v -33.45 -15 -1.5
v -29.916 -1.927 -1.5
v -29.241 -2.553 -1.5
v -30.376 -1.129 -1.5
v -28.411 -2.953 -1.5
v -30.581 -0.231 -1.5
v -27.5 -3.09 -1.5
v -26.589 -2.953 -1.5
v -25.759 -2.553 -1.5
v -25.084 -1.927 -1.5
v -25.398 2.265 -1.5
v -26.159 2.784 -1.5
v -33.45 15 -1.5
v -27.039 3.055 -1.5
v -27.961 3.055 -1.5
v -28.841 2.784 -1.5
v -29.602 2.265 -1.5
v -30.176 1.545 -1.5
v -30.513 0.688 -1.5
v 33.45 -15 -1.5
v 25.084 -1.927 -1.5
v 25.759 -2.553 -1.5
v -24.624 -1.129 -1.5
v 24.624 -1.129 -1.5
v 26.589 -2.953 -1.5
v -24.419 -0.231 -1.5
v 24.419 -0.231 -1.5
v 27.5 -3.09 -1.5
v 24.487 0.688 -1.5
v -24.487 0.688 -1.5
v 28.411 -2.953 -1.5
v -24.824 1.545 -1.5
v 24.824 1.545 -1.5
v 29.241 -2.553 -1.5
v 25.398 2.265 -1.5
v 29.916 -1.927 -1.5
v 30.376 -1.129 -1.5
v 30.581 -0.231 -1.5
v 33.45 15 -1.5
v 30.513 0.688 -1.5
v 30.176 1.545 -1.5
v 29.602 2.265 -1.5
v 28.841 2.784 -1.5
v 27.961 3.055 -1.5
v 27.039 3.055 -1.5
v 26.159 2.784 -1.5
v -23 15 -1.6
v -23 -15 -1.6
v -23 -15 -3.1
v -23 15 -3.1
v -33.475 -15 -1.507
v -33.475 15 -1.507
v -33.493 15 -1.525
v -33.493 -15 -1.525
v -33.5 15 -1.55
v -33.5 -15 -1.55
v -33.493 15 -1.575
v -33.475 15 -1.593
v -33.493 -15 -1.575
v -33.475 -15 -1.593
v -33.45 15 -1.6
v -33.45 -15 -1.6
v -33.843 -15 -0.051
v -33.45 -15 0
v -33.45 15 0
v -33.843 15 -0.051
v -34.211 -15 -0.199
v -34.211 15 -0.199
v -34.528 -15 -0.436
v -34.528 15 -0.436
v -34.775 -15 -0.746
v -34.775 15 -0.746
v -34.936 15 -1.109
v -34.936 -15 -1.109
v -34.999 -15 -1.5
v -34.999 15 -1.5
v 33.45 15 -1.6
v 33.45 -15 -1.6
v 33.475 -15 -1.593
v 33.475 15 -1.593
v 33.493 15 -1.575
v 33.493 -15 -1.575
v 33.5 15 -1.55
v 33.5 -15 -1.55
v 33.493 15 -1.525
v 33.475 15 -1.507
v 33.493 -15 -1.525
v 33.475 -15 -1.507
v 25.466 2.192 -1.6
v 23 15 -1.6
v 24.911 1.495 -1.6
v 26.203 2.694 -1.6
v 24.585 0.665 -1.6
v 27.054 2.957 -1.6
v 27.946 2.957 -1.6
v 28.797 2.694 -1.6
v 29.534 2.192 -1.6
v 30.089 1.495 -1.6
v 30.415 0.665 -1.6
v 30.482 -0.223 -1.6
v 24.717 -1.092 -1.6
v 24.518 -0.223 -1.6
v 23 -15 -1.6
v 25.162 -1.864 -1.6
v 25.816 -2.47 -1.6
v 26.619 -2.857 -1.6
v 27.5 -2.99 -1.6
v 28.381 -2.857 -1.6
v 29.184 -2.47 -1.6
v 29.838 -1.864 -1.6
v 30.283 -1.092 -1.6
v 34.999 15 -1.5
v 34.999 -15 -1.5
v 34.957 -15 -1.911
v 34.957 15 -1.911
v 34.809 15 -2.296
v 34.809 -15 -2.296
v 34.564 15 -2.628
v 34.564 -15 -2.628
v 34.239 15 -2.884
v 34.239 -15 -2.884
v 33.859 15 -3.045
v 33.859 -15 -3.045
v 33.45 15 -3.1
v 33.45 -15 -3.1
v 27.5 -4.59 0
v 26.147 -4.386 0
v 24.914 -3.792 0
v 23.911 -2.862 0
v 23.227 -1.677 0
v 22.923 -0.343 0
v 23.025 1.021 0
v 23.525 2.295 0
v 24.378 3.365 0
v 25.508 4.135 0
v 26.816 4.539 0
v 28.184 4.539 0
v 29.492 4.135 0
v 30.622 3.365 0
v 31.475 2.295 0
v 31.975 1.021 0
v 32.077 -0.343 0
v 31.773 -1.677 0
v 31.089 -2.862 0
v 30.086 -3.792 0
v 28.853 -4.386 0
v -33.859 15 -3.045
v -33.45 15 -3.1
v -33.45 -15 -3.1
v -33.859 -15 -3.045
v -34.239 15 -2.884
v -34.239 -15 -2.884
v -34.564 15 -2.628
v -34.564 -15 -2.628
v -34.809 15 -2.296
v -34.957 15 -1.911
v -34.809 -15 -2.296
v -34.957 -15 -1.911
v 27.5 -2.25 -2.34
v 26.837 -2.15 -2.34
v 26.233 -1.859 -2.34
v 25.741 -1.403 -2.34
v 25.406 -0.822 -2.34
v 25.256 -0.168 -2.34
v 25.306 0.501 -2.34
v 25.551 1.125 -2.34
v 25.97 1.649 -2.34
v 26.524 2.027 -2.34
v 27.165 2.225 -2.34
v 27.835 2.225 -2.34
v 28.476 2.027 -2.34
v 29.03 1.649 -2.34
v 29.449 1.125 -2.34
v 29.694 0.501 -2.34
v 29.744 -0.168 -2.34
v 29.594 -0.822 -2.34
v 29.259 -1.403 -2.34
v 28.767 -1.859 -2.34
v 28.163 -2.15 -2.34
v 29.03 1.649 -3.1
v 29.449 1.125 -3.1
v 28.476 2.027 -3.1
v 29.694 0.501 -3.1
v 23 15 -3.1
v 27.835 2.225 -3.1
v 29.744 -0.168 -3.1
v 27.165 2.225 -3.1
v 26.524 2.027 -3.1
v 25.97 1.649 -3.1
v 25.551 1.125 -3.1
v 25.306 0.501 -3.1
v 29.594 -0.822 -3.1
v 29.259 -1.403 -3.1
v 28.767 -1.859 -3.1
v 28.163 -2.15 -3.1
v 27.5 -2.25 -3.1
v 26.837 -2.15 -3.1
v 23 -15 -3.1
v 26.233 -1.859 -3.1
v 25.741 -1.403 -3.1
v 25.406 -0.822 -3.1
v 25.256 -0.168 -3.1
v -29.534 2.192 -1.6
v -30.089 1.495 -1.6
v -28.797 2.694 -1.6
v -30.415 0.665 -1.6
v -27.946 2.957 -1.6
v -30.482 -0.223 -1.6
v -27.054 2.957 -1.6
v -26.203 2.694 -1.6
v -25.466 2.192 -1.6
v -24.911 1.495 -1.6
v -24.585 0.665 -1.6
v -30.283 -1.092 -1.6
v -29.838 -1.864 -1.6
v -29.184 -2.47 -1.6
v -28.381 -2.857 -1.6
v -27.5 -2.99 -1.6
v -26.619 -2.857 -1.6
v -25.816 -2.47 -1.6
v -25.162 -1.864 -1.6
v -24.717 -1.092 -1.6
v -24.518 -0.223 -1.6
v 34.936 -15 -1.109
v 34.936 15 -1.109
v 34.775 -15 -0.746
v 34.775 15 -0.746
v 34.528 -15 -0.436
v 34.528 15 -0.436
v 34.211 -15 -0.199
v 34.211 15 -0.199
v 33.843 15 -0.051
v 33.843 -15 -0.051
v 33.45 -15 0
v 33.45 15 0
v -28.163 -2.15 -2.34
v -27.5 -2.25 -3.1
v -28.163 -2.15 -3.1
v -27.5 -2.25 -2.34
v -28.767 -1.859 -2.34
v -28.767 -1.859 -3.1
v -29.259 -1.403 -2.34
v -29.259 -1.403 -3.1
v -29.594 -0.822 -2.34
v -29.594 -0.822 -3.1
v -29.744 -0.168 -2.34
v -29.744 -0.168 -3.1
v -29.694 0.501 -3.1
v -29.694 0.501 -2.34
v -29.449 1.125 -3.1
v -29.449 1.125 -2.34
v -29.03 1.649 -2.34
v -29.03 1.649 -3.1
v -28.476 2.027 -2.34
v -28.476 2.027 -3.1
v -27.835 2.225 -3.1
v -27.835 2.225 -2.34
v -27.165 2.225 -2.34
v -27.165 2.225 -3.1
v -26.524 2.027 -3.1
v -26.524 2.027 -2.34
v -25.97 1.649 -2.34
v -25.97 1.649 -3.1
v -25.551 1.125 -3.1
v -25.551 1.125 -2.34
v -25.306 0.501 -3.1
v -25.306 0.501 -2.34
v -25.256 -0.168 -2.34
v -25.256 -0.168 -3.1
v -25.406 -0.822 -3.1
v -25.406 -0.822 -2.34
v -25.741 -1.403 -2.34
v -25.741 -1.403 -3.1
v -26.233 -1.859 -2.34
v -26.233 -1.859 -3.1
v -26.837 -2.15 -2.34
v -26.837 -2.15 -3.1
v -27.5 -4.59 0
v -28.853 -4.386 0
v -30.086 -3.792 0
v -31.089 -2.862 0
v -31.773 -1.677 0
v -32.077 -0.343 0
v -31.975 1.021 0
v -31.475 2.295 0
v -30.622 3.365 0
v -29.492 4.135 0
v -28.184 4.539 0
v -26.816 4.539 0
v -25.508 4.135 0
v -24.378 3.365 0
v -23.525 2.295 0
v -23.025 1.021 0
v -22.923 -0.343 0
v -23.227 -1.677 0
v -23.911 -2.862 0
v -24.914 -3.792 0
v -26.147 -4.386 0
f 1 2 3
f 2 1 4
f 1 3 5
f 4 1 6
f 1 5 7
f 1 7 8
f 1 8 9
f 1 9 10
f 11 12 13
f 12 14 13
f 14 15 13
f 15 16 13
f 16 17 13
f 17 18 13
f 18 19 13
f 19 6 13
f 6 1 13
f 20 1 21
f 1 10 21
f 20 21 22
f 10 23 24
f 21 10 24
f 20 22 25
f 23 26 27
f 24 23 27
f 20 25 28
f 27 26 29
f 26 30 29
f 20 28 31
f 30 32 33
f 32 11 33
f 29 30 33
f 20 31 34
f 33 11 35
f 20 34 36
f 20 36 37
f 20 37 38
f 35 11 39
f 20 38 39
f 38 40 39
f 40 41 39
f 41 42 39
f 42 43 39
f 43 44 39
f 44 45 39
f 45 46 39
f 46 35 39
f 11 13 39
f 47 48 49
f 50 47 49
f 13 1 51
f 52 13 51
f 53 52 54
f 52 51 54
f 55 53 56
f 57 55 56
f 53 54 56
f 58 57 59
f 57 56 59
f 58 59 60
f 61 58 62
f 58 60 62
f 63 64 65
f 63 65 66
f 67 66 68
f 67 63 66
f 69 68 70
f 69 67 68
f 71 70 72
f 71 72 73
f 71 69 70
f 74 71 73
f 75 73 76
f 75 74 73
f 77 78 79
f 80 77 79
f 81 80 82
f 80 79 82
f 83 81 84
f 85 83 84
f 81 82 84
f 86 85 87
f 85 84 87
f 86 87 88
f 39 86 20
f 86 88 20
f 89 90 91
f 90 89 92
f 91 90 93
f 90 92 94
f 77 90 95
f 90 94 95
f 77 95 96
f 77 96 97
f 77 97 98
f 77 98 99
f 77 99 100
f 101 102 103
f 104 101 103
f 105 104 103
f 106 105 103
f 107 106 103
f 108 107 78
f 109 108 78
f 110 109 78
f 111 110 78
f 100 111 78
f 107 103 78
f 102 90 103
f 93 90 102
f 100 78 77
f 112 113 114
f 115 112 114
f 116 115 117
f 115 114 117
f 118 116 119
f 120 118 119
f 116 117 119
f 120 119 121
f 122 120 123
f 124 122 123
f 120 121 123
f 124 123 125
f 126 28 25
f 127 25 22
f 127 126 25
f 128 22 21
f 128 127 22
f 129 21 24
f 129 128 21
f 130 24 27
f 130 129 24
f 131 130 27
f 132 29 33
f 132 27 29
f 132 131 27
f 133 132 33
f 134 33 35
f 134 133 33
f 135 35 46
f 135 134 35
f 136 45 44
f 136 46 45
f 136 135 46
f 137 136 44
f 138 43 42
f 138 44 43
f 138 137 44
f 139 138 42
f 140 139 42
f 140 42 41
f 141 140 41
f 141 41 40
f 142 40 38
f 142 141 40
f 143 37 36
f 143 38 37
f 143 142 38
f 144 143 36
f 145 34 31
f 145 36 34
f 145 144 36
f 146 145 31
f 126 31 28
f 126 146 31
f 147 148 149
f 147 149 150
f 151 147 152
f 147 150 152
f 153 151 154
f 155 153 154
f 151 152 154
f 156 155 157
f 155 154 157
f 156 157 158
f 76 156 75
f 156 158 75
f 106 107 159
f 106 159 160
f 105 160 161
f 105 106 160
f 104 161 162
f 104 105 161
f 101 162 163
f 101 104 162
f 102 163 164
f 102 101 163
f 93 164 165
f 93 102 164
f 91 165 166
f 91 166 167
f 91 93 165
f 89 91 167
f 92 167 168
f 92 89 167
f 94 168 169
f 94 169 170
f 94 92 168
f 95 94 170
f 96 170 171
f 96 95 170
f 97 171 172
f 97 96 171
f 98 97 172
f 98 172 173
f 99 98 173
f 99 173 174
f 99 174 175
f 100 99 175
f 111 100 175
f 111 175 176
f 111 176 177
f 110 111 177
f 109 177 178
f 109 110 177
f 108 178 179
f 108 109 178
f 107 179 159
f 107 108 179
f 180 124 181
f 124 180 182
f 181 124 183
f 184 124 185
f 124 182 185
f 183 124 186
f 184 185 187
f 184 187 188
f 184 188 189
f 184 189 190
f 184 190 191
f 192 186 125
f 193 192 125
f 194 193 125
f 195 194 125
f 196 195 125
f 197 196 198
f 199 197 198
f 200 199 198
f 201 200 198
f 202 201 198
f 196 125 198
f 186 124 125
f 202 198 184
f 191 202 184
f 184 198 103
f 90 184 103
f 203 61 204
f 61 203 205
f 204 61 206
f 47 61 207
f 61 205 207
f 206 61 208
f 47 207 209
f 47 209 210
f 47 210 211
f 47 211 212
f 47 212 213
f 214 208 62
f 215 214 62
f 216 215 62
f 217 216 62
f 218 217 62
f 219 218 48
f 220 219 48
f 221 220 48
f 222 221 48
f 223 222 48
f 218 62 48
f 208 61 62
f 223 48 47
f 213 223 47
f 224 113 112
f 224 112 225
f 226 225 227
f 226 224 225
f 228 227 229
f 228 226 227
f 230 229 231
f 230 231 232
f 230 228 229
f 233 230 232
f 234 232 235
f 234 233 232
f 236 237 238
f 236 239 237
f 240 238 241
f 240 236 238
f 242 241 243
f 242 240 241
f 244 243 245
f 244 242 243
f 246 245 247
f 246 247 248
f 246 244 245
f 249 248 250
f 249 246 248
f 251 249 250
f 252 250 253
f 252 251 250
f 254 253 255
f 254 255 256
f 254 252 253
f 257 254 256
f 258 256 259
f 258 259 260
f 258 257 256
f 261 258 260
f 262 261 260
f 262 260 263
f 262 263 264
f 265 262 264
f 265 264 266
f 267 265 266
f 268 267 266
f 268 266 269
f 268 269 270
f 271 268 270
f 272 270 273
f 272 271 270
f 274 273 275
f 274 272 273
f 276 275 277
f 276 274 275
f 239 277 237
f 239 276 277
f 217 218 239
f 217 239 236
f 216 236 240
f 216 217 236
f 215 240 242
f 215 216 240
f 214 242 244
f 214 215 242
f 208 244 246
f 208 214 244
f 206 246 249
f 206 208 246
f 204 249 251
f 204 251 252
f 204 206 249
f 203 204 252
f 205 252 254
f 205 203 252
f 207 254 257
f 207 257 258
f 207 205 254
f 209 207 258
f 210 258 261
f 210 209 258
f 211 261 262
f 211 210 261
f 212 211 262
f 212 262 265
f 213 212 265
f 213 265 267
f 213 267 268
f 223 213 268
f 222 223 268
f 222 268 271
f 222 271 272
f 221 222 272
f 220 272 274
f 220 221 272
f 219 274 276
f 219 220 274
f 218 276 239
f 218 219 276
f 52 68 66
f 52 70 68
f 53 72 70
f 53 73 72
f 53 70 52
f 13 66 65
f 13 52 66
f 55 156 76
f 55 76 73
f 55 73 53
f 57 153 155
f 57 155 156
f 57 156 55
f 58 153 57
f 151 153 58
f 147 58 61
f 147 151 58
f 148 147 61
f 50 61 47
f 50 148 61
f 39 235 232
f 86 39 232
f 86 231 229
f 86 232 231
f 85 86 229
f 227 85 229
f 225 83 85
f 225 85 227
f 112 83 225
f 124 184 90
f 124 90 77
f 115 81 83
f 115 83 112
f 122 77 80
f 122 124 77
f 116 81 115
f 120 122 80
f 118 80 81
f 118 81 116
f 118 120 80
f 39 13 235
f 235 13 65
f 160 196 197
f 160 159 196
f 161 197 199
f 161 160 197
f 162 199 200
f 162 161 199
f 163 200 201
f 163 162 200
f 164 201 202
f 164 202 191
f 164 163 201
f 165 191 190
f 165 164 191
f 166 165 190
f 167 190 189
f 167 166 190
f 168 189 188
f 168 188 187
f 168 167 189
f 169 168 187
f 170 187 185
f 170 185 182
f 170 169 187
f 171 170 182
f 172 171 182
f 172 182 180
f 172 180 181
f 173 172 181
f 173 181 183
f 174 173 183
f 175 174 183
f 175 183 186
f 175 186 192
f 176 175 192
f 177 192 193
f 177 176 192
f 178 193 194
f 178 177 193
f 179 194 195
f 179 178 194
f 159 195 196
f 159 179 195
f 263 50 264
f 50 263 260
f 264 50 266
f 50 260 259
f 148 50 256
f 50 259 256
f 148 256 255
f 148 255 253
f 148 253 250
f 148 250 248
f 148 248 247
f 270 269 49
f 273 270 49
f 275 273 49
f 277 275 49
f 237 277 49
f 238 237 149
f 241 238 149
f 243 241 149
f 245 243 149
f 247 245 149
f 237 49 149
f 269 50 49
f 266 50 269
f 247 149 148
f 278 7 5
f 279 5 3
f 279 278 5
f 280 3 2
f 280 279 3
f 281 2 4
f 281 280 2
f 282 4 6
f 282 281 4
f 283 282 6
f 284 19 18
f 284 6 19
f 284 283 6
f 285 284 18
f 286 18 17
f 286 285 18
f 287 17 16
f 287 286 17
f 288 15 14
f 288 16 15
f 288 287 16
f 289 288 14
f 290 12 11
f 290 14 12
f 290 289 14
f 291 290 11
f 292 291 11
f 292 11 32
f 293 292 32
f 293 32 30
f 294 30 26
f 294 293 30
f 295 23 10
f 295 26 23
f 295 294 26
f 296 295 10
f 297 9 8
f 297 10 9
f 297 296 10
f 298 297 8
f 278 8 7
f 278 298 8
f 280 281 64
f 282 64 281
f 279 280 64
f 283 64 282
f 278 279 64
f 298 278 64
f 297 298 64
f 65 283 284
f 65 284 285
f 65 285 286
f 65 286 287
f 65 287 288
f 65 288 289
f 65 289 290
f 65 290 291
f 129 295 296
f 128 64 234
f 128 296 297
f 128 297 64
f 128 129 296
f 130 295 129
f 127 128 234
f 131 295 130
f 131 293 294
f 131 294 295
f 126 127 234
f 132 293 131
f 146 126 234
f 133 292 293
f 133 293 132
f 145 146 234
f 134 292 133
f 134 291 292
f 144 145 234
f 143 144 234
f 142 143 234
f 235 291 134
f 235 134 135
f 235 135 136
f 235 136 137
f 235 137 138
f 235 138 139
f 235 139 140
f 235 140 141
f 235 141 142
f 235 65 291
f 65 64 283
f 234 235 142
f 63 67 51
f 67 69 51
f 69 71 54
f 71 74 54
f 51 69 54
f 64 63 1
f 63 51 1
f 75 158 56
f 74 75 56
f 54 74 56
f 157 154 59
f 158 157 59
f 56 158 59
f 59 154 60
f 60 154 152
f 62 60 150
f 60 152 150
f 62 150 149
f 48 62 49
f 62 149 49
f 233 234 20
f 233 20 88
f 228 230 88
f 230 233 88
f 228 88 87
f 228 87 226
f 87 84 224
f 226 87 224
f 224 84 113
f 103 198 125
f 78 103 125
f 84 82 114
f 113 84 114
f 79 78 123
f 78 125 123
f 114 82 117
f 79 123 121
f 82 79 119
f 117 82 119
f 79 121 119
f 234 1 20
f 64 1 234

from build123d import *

# Parameters (mm, degrees)
SKETCH_2_W                  = 70
SKETCH_2_H                  = 30
SM_BASE_FLANGE_1_DEPTH      = 1.5
OTHER_START                 = -15
OTHER_1_DEPTH               = 30
OTHER_1_2_DEPTH             = 30
HOLE_WIZARD_M4_1_AT_2_COUNT = 2
HOLE_WIZARD_M4_1_AT_2_PITCH = 55


# Read off the part's stored shape, not the designer's step: 褶边1
# Sheet-metal steps are written as plain solids
with BuildPart() as part:
    # 草图2 → 基体-法兰1 (new body)
    with BuildSketch(Plane.XY):
        Rectangle(SKETCH_2_W, SKETCH_2_H)
    extrude(amount=-SM_BASE_FLANGE_1_DEPTH)

    # Other 1 outline → Other 1 (cut)
    with BuildSketch(Plane(origin=(0, 0, 0), x_dir=(1, 0, 0), z_dir=(0, 1, 0)).offset(OTHER_START)):
        with BuildLine():
            Line((35, 1.5), (34.999193338, 1.5))
            ThreePointArc((34.999193338, 1.5), (34.528192933, 0.436447127), (33.45, 0))
            Line((33.45, 0), (35, 0))
            Line((35, 0), (35, 1.5))
        make_face()
        with BuildLine():
            ThreePointArc((-33.45, 0), (-34.528192933, 0.436447127), (-34.999193338, 1.5))
            Line((-34.999193338, 1.5), (-35, 1.5))
            Line((-35, 1.5), (-35, 0))
            Line((-35, 0), (-33.45, 0))
        make_face()
    extrude(amount=OTHER_1_DEPTH, mode=Mode.SUBTRACT)

    # Other 1 2 outline → Other 1 2 (add)
    with BuildSketch(Plane(origin=(0, 0, 0), x_dir=(1, 0, 0), z_dir=(0, 1, 0)).offset(OTHER_START)):
        with BuildLine():
            Line((23, 3.1), (23, 1.6))
            Line((23, 1.6), (33.45, 1.6))
            ThreePointArc((33.45, 1.6), (33.5, 1.55), (33.45, 1.5))
            Line((33.45, 1.5), (34.999193338, 1.5))
            ThreePointArc((34.999193338, 1.5), (34.563552873, 2.628192933), (33.45, 3.1))
            Line((33.45, 3.1), (23, 3.1))
        make_face()
        with BuildLine():
            Line((-34.999193338, 1.5), (-33.45, 1.5))
            ThreePointArc((-33.45, 1.5), (-33.5, 1.55), (-33.45, 1.6))
            Line((-33.45, 1.6), (-23, 1.6))
            Line((-23, 1.6), (-23, 3.1))
            Line((-23, 3.1), (-33.45, 3.1))
            ThreePointArc((-33.45, 3.1), (-34.563552873, 2.628192933), (-34.999193338, 1.5))
        make_face()
    extrude(amount=OTHER_1_2_DEPTH)

    # 草图9 → M4 六角凹锥坑头螺钉的锥形沉头孔1 (revolve, cut)
    with BuildSketch(Plane(origin=(27.5, 0, 0), x_dir=(0, -1, 0), z_dir=(1, 0, 0))):
        Polygon((0, 0), (0, 3.1), (2.25, 3.1), (2.25, 2.34), (4.59, 0), align=None)
    hole_wizard_m4_1 = revolve(axis=Axis((27.5, 0, 6.35), (0, 0, -1)), mode=Mode.SUBTRACT)

    # M4 六角凹锥坑头螺钉的锥形沉头孔1 at 2: M4 六角凹锥坑头螺钉的锥形沉头孔1 ×2
    with Locations(*[(-i * HOLE_WIZARD_M4_1_AT_2_PITCH, 0, 0) for i in range(1, HOLE_WIZARD_M4_1_AT_2_COUNT)]):
        add(hole_wizard_m4_1, mode=Mode.SUBTRACT)


solid = part.part
